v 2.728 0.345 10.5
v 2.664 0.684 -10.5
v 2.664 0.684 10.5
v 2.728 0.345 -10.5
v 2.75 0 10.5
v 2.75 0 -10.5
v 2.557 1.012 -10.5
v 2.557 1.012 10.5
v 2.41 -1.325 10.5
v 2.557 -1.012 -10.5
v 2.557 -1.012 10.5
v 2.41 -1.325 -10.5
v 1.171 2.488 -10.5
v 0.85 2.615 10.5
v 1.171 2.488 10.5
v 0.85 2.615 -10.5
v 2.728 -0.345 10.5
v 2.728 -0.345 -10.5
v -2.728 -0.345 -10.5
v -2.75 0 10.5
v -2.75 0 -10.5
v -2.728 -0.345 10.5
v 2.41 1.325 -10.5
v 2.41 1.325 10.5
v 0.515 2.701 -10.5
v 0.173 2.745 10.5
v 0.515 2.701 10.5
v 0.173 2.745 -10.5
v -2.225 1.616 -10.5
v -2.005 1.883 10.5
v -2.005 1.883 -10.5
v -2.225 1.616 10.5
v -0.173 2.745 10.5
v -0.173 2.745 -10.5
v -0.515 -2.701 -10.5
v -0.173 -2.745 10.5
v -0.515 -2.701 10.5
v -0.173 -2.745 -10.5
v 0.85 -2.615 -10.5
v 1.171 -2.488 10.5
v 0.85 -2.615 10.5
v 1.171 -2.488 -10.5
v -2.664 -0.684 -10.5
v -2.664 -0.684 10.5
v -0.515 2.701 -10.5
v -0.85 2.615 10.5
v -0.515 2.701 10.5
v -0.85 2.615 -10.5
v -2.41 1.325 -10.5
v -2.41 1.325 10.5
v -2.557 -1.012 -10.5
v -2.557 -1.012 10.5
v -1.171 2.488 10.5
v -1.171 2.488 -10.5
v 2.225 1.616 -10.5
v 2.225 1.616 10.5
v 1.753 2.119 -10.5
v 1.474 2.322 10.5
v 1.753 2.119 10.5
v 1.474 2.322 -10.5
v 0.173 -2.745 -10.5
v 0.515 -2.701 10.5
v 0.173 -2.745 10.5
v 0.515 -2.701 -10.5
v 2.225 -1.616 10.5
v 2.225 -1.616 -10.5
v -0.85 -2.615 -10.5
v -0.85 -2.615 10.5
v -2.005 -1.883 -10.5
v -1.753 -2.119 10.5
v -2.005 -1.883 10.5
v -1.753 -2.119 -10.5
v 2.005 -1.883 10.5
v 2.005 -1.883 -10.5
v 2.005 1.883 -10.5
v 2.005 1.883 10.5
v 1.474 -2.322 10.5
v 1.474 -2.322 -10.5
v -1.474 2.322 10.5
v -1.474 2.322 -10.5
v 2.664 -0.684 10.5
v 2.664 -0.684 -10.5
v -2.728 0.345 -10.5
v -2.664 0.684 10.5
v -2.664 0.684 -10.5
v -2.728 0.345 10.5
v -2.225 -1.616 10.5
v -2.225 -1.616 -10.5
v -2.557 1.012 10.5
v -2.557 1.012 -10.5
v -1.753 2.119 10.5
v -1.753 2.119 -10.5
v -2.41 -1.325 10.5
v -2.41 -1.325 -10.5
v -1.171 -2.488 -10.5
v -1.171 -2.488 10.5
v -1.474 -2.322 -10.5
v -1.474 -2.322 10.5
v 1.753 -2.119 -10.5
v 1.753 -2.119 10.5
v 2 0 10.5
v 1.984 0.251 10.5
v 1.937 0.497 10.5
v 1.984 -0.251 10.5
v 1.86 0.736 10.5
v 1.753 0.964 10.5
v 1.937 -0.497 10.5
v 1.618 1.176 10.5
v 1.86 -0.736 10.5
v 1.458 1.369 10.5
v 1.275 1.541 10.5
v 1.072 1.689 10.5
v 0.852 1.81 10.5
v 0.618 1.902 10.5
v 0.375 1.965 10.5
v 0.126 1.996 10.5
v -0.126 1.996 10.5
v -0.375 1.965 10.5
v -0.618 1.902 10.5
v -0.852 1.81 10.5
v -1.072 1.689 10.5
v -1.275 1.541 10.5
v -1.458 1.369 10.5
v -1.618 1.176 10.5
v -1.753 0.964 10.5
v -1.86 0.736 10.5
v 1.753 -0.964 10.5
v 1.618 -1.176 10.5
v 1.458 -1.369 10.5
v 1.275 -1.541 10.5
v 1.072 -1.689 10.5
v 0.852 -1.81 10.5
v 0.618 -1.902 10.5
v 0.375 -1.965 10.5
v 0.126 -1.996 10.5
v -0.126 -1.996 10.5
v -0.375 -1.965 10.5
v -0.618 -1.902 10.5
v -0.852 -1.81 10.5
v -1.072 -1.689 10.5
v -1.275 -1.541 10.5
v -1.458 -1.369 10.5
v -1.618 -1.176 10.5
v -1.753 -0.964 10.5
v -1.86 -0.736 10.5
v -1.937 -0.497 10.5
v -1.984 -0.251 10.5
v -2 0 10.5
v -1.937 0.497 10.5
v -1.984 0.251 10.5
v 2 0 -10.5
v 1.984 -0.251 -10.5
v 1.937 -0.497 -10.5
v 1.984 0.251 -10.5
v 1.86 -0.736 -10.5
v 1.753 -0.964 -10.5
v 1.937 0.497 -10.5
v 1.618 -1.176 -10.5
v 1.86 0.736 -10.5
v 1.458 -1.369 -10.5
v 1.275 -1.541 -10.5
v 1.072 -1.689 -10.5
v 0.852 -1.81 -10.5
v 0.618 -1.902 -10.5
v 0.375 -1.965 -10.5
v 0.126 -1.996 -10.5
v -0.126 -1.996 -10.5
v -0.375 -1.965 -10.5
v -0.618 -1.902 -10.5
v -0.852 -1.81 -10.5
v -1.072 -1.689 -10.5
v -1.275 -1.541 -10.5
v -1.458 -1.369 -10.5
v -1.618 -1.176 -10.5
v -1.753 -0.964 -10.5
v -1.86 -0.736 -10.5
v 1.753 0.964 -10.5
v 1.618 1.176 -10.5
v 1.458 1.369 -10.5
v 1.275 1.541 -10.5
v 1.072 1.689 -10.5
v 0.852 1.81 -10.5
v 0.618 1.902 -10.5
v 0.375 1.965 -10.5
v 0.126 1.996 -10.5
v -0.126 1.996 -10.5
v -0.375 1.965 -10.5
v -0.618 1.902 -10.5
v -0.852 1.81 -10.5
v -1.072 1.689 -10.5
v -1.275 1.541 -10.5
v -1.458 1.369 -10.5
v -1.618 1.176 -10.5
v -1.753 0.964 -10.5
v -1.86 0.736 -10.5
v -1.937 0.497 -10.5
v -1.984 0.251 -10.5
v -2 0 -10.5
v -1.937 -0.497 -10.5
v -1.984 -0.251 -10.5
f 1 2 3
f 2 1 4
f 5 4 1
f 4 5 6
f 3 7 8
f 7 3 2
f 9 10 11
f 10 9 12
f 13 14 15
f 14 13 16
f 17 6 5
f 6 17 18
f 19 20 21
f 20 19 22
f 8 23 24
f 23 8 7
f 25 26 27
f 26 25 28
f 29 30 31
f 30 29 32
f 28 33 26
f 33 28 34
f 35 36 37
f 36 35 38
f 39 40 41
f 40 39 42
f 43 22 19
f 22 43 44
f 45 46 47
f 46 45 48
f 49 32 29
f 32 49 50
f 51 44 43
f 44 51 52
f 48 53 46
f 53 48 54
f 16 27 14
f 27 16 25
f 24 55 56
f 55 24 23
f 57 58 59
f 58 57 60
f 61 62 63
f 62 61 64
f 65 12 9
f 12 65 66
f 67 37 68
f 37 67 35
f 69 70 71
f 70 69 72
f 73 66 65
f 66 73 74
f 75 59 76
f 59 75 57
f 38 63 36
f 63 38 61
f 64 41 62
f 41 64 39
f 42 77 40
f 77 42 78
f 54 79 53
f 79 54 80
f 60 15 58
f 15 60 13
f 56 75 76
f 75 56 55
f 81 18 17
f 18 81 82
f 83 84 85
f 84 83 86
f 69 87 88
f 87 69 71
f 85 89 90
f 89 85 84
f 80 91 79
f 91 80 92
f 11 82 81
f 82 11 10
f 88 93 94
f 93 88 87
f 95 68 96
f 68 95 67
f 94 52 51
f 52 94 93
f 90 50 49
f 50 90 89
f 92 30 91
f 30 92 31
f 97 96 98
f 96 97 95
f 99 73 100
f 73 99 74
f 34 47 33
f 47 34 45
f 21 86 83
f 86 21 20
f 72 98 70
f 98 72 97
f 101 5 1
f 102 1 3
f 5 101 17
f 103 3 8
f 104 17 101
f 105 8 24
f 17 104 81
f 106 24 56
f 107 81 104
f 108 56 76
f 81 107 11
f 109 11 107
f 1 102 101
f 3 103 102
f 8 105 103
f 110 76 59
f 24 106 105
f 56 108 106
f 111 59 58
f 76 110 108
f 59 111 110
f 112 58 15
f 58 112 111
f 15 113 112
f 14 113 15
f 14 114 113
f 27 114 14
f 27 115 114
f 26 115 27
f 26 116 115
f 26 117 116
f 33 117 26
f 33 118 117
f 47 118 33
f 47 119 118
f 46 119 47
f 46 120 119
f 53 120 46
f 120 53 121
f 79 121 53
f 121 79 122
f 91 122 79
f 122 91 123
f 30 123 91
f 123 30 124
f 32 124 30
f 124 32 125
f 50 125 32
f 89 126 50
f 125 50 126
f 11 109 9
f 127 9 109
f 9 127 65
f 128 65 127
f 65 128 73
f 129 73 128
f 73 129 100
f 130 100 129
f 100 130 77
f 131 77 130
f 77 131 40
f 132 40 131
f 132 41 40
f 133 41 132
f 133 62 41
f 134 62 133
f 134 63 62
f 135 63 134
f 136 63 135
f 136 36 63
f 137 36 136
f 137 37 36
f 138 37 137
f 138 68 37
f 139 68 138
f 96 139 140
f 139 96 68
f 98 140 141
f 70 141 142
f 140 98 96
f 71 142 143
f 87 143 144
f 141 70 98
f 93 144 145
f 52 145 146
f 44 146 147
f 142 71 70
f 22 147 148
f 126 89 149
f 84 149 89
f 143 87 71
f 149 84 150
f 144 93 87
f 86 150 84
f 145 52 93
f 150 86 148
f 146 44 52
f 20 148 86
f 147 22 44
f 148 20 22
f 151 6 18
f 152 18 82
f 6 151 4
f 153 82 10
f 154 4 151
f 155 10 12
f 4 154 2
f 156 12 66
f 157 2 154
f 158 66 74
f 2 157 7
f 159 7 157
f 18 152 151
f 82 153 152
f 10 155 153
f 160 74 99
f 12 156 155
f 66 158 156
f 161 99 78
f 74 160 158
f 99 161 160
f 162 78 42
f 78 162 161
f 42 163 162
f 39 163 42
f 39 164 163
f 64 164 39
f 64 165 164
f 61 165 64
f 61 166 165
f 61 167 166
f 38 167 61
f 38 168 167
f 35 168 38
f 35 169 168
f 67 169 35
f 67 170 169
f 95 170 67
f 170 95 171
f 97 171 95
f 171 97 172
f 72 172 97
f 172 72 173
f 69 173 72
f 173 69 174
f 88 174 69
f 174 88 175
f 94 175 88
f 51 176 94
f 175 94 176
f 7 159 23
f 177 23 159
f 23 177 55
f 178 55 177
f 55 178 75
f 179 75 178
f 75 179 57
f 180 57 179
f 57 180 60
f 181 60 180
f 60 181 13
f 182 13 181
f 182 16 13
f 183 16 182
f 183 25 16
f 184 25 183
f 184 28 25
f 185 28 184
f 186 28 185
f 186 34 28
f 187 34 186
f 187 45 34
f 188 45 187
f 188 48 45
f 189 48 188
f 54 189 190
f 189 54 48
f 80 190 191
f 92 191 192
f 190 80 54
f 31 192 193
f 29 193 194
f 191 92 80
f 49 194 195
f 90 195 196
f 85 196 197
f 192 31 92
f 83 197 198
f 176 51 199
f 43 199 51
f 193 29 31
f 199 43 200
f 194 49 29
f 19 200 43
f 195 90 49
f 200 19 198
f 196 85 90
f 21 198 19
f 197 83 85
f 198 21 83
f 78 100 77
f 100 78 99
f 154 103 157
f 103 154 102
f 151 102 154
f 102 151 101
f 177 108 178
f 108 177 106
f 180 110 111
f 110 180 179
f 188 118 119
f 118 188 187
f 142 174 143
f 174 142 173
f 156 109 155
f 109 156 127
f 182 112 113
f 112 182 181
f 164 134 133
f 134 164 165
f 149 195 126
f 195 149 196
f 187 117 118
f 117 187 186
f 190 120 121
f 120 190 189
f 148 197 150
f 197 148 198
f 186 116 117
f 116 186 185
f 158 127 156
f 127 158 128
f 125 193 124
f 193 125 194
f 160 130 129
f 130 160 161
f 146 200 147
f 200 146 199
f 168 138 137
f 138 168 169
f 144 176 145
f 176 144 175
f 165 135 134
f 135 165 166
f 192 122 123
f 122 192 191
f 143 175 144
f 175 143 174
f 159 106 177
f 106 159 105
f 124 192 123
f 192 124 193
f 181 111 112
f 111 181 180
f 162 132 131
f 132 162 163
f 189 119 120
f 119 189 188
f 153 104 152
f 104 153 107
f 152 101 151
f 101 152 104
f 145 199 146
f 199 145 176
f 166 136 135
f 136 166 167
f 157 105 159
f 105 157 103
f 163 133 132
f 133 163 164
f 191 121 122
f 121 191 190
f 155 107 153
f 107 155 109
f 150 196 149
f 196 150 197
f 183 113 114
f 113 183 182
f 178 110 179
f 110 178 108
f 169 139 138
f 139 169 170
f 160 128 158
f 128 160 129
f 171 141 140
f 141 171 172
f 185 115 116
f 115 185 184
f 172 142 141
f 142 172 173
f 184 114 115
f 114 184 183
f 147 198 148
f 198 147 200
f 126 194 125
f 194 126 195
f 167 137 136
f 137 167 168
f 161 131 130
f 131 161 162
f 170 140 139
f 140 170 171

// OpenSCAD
$fn = 50;


difference() {
	union() {
		translate(v = [0, 0, -10.5000000000]) {
			cylinder(h = 21, r = 2.7500000000);
		}
	}
	union() {
		translate(v = [0, 0, -100.0000000000]) {
			cylinder(h = 200, r = 2.0000000000);
		}
	}
}
